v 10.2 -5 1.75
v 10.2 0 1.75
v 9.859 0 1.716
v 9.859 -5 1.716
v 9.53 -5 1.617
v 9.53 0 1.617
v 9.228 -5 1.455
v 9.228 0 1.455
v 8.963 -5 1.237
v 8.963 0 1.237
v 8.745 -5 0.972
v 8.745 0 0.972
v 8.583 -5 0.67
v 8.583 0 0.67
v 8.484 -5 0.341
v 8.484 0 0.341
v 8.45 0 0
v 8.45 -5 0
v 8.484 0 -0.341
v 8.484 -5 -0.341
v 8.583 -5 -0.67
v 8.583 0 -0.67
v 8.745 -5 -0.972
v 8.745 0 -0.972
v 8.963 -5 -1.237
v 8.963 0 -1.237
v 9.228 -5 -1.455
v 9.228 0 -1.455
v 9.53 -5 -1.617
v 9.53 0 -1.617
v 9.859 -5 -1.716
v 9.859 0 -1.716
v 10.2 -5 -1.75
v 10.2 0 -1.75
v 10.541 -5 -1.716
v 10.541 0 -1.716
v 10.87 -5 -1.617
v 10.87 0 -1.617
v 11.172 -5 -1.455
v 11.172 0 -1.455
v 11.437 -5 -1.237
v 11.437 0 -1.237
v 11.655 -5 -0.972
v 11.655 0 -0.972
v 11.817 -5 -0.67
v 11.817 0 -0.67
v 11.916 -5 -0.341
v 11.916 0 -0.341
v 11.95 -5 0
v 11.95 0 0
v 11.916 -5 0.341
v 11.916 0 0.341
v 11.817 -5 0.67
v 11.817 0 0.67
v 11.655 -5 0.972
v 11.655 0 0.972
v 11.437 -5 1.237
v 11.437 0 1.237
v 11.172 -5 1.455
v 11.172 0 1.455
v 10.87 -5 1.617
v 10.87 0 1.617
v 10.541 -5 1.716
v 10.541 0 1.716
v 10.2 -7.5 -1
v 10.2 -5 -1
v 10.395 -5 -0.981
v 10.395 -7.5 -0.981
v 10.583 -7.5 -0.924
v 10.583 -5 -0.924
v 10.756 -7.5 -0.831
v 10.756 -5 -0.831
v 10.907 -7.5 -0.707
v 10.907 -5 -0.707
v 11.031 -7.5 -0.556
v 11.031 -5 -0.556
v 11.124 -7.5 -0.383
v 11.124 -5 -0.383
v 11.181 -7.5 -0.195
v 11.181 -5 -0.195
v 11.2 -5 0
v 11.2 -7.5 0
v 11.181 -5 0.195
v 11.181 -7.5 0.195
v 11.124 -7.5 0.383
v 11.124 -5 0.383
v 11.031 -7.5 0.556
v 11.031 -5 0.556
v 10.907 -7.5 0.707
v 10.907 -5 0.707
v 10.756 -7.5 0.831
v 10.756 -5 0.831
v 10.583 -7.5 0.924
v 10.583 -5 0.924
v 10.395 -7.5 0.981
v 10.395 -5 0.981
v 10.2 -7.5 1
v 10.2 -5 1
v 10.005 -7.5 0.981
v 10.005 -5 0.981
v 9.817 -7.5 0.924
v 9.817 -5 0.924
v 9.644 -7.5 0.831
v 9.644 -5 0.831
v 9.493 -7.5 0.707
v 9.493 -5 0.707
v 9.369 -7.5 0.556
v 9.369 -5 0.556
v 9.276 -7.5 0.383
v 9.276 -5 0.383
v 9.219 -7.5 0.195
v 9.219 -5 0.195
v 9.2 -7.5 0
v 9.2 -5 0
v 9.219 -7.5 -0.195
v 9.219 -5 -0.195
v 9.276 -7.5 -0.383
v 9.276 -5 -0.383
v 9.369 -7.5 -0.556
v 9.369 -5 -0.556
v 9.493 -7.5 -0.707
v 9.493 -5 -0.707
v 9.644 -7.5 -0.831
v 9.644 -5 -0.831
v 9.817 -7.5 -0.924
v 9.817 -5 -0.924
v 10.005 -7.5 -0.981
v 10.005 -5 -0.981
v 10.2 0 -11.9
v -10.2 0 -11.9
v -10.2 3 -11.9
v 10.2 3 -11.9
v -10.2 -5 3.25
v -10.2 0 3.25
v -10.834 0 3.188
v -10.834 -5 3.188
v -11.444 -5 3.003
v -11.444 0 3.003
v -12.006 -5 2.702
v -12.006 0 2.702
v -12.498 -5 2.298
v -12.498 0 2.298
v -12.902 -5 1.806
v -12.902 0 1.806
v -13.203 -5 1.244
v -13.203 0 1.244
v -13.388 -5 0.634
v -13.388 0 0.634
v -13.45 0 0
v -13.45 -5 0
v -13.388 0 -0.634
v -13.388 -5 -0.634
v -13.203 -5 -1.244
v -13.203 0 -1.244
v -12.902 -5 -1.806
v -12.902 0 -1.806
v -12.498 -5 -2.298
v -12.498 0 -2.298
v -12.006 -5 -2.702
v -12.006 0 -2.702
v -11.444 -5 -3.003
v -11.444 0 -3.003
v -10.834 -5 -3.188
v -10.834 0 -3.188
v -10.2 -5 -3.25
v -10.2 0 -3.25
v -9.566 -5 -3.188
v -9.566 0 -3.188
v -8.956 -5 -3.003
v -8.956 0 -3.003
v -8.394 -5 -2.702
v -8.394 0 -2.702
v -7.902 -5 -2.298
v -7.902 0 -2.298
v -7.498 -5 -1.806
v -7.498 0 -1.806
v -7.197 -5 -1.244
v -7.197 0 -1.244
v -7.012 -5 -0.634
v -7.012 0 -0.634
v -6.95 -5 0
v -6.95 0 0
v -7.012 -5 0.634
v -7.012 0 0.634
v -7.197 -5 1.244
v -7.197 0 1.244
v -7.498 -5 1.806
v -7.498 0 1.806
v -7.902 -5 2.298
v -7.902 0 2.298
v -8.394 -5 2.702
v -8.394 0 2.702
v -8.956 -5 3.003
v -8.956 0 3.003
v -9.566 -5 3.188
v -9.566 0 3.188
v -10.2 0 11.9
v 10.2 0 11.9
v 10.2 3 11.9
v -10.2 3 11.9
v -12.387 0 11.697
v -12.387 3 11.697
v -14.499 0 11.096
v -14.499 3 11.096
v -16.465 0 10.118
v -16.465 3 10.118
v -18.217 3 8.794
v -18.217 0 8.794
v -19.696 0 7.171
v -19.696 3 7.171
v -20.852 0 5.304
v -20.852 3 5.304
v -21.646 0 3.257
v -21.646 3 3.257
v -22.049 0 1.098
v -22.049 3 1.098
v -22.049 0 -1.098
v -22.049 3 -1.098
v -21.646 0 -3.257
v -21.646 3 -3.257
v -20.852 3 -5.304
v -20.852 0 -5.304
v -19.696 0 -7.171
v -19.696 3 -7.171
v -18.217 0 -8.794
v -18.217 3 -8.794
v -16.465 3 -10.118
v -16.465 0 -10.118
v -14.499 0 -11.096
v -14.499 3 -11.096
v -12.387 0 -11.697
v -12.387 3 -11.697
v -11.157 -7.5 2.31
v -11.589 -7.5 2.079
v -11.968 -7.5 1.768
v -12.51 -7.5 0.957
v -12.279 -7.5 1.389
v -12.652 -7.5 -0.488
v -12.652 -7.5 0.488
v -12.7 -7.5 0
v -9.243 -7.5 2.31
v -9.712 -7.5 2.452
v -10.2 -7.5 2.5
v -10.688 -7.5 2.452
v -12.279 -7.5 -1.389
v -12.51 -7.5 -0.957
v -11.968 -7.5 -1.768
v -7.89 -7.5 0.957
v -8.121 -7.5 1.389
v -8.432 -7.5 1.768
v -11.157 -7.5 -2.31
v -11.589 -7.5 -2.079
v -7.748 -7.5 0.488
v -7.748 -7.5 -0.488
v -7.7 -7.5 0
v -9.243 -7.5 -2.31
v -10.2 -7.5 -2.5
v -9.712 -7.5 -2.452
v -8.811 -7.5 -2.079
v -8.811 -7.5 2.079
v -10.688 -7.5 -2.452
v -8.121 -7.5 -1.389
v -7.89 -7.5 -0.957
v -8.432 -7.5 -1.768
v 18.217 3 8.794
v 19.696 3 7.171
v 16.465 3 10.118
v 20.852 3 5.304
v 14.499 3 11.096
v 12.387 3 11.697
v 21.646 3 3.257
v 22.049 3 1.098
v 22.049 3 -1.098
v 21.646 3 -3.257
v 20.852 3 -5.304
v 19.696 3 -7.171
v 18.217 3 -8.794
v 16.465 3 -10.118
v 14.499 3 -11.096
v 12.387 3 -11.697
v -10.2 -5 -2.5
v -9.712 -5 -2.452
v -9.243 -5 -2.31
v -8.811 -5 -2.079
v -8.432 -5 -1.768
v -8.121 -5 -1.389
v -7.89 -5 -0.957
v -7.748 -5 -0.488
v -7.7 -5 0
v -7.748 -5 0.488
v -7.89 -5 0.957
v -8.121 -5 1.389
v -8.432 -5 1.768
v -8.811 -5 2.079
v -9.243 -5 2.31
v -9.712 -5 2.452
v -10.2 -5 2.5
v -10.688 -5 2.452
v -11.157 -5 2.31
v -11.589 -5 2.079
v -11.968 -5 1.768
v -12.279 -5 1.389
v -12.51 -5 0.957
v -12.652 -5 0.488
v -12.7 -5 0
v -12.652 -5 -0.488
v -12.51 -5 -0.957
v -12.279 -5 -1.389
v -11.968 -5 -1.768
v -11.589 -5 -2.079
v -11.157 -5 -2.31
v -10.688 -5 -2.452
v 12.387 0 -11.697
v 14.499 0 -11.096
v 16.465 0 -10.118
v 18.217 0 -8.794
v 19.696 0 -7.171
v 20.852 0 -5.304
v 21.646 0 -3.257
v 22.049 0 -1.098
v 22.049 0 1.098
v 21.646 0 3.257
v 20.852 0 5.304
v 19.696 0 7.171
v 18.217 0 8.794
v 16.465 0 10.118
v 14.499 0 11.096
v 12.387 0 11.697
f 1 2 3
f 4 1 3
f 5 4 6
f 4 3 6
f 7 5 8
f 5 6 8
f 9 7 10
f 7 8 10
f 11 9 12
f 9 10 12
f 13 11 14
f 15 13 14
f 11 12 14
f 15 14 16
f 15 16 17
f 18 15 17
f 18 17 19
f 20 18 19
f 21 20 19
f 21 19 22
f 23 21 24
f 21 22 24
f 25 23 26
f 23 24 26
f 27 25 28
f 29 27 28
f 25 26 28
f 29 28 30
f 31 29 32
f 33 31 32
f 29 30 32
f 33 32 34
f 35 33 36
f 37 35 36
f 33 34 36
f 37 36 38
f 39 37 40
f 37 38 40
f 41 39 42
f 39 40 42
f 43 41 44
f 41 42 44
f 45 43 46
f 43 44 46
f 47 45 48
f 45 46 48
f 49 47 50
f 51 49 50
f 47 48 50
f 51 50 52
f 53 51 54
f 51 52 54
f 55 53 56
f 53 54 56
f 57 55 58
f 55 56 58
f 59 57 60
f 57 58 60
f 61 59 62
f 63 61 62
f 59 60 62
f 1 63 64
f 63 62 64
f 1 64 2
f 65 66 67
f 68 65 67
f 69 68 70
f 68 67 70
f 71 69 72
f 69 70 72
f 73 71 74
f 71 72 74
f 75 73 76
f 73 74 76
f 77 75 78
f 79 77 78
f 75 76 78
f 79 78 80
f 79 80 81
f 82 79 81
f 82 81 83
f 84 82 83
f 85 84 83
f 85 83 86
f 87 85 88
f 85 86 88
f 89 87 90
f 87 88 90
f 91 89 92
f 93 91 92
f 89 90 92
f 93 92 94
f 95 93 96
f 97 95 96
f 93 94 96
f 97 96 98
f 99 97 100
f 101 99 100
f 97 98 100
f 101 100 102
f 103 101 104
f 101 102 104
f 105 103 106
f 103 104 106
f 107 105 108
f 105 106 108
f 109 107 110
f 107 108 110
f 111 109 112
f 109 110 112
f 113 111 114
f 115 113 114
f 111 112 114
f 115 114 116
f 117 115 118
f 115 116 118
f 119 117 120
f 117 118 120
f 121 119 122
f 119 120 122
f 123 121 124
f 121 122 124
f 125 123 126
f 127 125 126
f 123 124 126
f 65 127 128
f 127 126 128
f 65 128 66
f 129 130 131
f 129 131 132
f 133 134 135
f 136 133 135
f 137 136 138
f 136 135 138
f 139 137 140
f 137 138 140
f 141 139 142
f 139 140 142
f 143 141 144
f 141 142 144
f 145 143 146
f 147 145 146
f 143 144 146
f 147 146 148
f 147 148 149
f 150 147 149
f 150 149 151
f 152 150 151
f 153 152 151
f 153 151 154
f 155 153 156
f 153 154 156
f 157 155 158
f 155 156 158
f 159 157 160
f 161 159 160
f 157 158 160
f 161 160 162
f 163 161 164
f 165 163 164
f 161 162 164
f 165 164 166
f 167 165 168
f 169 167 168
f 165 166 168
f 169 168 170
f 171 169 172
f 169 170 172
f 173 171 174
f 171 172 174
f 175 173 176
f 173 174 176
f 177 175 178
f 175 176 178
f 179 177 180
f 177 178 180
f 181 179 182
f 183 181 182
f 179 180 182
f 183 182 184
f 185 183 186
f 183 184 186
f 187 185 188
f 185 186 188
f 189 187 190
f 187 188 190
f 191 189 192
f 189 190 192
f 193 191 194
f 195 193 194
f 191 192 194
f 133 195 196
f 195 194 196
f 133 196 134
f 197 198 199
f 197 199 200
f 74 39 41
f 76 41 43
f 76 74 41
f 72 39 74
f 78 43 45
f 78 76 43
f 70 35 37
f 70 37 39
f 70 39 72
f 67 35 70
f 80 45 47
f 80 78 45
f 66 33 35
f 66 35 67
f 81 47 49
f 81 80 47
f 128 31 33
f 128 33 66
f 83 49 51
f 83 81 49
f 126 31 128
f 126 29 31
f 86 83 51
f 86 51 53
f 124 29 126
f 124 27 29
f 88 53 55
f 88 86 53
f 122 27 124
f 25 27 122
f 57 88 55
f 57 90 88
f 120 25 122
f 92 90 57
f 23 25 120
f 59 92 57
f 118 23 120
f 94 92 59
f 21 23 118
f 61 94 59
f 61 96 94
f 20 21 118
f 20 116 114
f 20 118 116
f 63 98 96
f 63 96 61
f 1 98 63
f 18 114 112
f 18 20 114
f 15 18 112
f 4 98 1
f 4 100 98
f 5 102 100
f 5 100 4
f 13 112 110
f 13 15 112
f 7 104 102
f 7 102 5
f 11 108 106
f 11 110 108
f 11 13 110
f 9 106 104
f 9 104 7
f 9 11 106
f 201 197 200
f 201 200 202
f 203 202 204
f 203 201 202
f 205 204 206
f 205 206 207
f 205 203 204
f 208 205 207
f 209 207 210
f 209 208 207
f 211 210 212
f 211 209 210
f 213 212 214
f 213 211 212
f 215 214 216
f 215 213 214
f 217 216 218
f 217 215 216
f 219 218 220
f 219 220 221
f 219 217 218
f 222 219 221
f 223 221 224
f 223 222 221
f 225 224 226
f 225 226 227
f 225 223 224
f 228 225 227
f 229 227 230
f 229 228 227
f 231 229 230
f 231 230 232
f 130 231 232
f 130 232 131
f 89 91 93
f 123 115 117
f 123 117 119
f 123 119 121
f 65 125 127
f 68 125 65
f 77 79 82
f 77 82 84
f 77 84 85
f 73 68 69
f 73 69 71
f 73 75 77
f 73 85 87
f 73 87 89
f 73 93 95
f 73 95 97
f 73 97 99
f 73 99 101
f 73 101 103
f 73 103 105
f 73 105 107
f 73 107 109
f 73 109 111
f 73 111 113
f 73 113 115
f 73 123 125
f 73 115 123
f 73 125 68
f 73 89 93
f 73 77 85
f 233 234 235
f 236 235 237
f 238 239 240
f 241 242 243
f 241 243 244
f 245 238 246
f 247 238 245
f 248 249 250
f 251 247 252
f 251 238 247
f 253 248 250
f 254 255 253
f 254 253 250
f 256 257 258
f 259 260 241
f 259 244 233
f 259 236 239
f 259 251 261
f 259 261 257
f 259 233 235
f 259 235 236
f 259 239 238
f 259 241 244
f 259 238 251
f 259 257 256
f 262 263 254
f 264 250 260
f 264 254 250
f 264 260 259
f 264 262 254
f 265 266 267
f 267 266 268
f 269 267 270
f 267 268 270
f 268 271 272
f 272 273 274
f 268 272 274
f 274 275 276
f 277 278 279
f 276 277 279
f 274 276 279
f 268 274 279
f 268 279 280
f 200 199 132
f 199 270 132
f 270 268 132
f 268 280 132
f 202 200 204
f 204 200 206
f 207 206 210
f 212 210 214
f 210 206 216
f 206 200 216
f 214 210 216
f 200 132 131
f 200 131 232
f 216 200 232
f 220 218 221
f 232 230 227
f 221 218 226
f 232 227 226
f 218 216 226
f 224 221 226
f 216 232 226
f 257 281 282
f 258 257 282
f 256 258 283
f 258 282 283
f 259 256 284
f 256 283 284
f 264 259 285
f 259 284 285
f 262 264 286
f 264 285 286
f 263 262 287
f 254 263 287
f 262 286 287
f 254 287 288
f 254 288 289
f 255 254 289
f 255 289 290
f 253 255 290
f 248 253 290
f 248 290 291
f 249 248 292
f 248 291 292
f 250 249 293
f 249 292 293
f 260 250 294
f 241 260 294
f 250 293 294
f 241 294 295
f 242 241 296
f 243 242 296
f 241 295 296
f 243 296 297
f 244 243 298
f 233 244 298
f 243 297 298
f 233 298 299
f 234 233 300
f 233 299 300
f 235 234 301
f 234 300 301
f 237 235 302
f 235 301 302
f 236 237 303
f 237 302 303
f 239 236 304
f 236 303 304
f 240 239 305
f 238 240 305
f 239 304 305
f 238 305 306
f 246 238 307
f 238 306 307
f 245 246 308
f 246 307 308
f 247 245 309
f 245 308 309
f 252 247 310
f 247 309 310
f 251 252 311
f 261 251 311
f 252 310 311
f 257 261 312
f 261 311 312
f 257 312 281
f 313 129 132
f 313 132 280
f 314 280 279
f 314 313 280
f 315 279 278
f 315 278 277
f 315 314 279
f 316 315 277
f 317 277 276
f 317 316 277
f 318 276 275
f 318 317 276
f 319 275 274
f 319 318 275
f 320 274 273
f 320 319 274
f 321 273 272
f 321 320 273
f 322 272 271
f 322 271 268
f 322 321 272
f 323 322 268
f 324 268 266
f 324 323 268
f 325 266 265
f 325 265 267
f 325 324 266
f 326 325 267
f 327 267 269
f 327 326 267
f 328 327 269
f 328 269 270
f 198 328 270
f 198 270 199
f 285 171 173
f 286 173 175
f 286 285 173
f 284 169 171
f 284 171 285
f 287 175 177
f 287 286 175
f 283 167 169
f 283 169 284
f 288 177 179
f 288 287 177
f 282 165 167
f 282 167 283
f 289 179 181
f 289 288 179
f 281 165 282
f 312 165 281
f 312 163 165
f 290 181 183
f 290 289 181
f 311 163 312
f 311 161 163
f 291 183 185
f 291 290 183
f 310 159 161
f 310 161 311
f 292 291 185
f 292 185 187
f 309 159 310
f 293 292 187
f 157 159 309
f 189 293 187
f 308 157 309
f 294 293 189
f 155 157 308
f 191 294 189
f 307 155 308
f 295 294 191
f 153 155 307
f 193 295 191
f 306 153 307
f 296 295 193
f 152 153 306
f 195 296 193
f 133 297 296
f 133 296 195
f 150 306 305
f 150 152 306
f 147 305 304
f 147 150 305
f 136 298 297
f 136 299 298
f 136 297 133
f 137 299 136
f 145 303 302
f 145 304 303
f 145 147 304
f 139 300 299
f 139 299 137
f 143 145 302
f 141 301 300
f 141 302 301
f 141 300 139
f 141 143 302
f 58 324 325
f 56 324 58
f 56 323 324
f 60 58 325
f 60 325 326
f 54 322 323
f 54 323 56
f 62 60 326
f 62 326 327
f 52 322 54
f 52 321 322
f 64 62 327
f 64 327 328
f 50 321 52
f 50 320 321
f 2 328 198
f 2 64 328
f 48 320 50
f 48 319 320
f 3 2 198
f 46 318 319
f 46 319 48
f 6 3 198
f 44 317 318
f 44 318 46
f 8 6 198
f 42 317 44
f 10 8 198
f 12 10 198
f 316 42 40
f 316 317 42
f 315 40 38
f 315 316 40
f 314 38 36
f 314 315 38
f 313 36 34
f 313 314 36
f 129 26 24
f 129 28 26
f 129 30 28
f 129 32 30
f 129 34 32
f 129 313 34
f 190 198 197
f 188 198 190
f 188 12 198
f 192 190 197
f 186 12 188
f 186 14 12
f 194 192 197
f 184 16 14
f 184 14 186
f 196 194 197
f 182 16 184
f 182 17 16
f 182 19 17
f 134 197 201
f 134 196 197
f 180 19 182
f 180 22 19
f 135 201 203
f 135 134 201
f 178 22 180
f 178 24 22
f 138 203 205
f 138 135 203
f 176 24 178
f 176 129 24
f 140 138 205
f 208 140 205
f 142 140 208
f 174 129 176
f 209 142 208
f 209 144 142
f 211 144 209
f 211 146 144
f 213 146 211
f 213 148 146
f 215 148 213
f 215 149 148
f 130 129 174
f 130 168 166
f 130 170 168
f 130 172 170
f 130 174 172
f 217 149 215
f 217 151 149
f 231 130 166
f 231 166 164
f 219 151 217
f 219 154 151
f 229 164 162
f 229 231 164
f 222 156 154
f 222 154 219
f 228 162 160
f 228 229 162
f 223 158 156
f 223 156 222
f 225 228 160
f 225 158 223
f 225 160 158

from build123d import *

# Parameters (mm, degrees)
BOSS_EXTRU_1_DEPTH = 3
ESQUISSE2_R        = 3.25
ESQUISSE2_R_2      = 1.75
BOSS_EXTRU_2_DEPTH = 5
ESQUISSE3_R        = 2.5
ESQUISSE3_R_2      = 1
BOSS_EXTRU_3_DEPTH = 2.5


with BuildPart() as part:
    # Esquisse1 → Boss.-Extru.1 (new body)
    with BuildSketch(Plane(origin=(0, 0, 0), x_dir=(1, 0, 0), z_dir=(0, 1, 0))):
        with BuildLine():
            Line((10.2, -11.9), (-10.2, -11.9))
            ThreePointArc((-10.2, -11.9), (-22.1, 0), (-10.2, 11.9))
            Line((-10.2, 11.9), (10.2, 11.9))
            ThreePointArc((10.2, 11.9), (22.1, 0), (10.2, -11.9))
        make_face()
    extrude(amount=BOSS_EXTRU_1_DEPTH)

    # Esquisse2 → Boss.-Extru.2 (add)
    with BuildSketch(Plane.XZ):
        with Locations(Location((-10.2, 0, 0), (0, 0, 90))):
            Circle(ESQUISSE2_R)
        with Locations(Location((10.2, 0, 0), (0, 0, 90))):
            Circle(ESQUISSE2_R_2)
    extrude(amount=BOSS_EXTRU_2_DEPTH)

    # Esquisse3 → Boss.-Extru.3 (add)
    with BuildSketch(Plane.XZ.offset(5)):
        with Locations(Location((-10.2, 0, 0), (0, 0, 270))):
            Circle(ESQUISSE3_R)
        with Locations(Location((10.2, 0, 0), (0, 0, 270))):
            Circle(ESQUISSE3_R_2)
    extrude(amount=BOSS_EXTRU_3_DEPTH)


solid = part.part
